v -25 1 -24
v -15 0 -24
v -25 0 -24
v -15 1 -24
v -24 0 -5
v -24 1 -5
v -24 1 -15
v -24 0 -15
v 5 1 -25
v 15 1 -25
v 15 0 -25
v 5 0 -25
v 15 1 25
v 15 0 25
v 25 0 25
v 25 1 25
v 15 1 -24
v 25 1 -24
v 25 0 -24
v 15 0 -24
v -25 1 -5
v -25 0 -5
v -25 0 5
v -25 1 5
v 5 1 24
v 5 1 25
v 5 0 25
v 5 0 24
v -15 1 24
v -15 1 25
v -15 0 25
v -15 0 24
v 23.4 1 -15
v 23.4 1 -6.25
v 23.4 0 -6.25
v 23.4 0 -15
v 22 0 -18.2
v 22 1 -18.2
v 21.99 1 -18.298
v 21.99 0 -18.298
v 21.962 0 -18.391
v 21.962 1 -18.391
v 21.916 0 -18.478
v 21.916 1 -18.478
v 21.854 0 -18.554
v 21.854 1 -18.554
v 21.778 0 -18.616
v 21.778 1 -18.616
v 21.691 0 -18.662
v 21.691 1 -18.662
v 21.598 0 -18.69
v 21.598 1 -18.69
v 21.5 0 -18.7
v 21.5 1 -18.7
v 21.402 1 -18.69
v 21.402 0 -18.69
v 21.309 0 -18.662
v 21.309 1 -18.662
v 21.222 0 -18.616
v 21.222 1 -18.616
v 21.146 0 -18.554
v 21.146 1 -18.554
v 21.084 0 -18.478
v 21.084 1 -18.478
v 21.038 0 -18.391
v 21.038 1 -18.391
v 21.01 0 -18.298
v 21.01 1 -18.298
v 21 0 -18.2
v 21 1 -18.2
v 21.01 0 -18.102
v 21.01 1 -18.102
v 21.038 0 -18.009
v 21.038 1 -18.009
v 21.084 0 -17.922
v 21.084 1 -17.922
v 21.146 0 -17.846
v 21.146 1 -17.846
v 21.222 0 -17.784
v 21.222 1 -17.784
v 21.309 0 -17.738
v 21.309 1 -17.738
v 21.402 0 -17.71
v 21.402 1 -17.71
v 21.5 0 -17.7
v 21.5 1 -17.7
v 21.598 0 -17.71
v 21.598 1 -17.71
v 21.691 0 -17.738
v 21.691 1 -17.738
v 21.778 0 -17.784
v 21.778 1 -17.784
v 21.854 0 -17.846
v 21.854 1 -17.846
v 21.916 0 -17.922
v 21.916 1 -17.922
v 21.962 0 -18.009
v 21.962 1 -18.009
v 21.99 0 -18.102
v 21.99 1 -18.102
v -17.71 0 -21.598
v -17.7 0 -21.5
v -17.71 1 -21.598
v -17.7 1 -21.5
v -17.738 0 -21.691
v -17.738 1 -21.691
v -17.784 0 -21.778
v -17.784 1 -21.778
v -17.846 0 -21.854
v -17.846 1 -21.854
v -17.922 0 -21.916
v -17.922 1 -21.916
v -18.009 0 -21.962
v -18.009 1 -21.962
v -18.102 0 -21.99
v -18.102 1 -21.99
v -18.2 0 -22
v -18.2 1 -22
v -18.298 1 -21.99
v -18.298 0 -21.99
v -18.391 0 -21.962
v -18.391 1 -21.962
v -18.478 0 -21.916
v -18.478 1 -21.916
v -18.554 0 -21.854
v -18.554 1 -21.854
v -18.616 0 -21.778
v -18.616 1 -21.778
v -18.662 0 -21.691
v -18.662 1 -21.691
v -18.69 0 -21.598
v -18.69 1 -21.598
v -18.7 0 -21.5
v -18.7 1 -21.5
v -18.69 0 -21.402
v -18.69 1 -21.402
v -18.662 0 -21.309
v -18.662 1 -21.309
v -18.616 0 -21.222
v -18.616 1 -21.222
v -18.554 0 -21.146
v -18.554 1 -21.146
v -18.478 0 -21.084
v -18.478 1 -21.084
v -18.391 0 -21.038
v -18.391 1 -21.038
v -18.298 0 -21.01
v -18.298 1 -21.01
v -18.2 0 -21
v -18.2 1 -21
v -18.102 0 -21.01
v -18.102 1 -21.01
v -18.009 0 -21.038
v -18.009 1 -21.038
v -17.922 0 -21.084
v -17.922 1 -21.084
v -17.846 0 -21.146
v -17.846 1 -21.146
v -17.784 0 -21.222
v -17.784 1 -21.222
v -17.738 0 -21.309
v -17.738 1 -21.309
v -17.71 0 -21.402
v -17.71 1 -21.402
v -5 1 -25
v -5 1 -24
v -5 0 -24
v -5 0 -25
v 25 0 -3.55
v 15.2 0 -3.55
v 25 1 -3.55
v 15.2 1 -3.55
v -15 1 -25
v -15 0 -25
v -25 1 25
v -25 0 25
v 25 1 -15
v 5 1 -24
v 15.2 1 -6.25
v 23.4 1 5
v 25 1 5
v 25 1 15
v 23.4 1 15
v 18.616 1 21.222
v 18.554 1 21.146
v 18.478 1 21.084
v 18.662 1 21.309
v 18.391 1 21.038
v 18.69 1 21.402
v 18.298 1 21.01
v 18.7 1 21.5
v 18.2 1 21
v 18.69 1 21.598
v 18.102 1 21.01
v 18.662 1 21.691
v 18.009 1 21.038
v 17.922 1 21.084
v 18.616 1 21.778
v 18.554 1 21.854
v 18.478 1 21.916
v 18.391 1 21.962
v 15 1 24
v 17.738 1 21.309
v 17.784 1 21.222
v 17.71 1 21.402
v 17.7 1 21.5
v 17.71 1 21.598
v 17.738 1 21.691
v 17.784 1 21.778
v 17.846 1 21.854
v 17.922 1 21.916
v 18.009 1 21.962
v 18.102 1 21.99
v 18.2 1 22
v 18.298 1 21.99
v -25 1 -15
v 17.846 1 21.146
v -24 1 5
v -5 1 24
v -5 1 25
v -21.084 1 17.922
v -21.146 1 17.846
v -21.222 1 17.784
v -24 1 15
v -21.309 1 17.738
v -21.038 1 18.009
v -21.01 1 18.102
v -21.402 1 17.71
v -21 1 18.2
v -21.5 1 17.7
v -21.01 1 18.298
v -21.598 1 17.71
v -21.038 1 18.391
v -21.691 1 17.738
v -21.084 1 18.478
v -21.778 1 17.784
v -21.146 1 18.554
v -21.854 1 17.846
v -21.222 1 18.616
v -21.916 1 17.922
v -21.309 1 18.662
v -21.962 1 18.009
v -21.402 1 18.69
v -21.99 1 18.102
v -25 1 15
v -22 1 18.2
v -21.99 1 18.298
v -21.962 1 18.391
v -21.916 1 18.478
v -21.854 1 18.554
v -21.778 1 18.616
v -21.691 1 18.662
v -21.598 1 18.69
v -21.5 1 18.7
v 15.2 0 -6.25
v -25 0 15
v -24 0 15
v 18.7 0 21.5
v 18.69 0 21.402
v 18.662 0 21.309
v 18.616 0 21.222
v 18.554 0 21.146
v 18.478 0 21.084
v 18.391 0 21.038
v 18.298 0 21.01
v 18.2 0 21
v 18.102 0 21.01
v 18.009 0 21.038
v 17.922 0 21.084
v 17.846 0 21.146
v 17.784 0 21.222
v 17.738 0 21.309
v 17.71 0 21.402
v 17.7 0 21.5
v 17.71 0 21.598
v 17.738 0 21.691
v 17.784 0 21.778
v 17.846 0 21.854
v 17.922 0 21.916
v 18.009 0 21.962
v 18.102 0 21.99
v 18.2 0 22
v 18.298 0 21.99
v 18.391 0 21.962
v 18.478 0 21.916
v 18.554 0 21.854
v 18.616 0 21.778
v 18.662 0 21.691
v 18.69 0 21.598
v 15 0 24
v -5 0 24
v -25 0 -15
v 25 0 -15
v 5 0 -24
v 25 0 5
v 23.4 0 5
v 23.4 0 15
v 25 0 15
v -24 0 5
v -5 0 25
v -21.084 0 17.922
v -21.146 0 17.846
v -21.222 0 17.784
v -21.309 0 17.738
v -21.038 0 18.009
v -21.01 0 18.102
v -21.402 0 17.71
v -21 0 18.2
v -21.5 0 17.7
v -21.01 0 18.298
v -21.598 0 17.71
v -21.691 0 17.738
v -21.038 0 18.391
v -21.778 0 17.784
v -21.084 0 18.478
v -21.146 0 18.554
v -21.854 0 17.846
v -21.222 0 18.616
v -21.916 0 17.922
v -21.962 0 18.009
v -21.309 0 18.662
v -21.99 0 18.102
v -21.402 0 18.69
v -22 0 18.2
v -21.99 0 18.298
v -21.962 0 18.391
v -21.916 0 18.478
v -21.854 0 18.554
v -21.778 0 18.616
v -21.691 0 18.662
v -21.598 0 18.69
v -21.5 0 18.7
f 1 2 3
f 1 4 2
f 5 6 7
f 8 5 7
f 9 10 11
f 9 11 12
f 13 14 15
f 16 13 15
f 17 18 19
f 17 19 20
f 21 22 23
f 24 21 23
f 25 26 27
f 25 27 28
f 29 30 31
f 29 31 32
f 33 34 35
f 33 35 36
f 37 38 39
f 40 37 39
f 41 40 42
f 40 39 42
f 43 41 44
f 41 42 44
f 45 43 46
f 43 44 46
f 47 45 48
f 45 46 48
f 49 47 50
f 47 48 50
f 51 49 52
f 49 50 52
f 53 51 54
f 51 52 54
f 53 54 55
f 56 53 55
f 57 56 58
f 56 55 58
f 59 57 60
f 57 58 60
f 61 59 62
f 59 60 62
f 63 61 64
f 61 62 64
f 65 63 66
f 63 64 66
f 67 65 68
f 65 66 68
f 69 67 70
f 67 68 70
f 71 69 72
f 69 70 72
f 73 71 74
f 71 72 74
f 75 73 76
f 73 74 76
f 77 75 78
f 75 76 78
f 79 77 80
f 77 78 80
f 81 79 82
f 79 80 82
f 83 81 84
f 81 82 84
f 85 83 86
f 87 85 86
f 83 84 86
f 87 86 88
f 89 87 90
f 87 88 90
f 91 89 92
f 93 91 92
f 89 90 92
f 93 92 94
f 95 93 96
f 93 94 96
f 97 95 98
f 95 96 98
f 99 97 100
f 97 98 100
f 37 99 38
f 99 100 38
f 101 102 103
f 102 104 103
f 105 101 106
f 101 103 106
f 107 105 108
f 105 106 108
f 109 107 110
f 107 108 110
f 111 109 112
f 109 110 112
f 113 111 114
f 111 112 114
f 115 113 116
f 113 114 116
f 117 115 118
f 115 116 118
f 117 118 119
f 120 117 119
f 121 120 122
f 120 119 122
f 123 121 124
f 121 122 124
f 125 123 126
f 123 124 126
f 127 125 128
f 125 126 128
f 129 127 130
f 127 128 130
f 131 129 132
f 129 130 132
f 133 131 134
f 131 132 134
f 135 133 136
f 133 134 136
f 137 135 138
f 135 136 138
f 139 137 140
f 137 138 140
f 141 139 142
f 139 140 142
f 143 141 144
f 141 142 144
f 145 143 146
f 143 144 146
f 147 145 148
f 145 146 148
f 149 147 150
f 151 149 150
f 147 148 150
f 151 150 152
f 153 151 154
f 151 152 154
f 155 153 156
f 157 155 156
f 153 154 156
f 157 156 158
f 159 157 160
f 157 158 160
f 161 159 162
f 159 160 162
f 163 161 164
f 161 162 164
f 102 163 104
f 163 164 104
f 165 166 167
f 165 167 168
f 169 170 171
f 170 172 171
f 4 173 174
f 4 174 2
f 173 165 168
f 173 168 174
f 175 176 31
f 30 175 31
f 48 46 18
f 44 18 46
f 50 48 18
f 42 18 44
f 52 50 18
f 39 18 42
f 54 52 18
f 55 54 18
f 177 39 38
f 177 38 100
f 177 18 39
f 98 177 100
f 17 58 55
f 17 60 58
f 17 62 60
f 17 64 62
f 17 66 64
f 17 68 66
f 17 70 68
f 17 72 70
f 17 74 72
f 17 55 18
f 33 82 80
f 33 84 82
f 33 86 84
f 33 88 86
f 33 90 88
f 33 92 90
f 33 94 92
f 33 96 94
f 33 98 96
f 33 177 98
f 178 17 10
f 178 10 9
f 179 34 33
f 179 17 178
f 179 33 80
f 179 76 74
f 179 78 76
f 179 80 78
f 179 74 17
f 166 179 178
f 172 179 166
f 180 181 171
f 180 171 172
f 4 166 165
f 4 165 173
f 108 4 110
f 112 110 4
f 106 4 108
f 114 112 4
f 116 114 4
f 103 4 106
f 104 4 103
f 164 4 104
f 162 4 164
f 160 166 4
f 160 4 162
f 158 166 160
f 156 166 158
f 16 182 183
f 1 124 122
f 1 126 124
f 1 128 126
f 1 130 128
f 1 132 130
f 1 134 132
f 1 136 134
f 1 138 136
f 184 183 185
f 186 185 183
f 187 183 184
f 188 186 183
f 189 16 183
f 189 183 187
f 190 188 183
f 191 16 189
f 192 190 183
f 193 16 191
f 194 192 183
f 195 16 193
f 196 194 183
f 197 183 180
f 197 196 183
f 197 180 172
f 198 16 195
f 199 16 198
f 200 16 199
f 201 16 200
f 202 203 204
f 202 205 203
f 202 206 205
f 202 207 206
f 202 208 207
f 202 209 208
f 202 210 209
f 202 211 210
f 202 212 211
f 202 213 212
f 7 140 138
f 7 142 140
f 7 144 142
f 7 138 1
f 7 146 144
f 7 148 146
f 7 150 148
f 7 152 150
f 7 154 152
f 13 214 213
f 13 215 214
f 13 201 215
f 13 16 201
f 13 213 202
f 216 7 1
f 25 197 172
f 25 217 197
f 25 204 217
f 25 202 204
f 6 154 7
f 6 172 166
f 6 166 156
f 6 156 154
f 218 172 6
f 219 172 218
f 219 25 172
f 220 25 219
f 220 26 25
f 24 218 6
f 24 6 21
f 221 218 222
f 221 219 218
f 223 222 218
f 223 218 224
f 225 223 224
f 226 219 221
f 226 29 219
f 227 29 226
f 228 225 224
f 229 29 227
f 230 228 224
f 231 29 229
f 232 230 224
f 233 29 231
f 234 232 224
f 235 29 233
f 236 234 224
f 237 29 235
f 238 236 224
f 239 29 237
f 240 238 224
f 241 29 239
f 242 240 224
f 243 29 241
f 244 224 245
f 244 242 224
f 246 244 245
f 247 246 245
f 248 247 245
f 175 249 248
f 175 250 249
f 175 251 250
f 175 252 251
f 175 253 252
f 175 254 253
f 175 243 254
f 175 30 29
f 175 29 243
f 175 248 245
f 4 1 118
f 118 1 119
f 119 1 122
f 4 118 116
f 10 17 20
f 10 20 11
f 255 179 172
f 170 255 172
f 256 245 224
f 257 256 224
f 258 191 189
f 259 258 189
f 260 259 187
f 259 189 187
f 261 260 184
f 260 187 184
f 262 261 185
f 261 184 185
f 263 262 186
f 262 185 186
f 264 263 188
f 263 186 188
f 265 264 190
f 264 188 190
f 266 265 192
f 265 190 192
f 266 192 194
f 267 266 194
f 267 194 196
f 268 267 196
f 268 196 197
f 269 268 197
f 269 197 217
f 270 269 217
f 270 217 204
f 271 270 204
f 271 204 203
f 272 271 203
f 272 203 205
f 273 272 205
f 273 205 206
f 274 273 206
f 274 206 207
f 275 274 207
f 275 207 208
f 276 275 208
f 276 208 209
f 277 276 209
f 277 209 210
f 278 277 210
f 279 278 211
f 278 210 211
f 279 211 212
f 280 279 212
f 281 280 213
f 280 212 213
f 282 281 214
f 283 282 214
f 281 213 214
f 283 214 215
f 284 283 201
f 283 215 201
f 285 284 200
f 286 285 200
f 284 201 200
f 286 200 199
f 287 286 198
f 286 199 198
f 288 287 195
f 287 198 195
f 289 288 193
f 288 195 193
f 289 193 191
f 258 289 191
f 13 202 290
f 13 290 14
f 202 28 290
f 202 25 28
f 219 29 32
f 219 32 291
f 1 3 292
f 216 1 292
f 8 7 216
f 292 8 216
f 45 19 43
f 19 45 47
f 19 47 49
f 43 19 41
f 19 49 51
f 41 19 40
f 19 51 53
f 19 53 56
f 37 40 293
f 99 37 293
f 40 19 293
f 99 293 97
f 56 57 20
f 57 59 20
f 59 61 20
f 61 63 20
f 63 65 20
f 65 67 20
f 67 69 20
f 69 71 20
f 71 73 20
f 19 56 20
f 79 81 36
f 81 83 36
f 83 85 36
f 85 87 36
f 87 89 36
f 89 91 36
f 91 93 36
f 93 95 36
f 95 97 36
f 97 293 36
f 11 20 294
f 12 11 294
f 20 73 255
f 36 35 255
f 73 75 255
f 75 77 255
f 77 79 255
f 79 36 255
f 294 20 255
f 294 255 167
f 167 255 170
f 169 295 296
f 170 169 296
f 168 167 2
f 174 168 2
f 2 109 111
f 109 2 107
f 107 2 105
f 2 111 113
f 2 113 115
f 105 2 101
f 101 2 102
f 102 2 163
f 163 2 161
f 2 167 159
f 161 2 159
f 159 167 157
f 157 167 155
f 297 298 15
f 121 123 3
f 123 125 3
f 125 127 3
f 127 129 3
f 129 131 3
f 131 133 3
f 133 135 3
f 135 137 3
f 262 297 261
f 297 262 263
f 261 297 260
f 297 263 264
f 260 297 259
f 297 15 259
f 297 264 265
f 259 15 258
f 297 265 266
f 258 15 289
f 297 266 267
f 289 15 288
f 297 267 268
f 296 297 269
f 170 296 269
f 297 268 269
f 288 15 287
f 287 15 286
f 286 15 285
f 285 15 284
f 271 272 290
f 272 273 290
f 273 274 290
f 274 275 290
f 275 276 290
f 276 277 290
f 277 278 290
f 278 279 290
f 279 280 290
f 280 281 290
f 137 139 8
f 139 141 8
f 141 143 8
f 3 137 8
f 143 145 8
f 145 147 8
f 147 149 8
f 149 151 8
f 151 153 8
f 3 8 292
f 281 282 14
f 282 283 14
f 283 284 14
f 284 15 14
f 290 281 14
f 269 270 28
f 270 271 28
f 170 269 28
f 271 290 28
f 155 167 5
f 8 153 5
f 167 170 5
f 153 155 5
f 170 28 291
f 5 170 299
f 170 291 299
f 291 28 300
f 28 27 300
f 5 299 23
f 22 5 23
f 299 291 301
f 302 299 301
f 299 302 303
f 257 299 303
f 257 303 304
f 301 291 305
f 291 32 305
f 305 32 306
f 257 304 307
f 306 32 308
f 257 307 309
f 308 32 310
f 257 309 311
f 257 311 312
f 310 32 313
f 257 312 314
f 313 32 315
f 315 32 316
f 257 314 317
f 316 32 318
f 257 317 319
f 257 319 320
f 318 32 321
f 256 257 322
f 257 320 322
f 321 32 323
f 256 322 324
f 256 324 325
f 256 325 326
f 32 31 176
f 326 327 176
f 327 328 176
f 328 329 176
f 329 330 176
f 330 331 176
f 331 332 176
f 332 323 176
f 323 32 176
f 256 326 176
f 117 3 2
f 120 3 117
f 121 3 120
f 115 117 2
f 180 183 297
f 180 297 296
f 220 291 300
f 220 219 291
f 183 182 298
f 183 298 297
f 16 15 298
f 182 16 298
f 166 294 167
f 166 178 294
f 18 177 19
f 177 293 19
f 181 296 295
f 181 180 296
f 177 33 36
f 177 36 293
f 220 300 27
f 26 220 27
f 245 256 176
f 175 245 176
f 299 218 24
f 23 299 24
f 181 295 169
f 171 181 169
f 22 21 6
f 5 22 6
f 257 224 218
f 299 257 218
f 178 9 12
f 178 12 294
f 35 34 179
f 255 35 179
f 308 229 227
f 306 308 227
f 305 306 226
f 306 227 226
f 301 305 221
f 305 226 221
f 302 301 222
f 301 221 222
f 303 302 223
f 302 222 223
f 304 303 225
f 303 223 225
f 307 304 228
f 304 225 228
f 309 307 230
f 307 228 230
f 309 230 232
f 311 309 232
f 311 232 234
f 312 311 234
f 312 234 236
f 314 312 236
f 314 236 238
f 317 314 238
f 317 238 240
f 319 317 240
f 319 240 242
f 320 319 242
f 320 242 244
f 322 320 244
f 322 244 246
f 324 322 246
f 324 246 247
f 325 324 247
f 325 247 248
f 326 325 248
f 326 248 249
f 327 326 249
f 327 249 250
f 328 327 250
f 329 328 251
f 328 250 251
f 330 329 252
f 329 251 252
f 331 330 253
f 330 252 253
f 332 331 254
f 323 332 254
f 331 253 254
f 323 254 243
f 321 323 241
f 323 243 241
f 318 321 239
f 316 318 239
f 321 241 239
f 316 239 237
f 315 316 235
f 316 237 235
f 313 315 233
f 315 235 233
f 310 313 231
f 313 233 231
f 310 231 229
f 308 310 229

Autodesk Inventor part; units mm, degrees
ref_plane "YZ Plane" through (0, 0, 0) normal (1, 0, 0) x (0, 1, 0)
ref_plane "XZ Plane" through (0, 0, 0) normal (0, 1, 0) x (-1, 0, 0)
ref_plane "XY Plane" through (0, 0, 0) normal (0, 0, 1) x (1, 0, 0)
sketch "Sketch1" plane through (0, 0, 0) normal (0, 1, 0) x (-1, 0, 0)
  line L0 (-25, -25) -> (25, -25)
  line L1 (25, -25) -> (25, 25)
  line L2 (25, 25) -> (-25, 25)
  line L3 (-25, 25) -> (-25, -25)
  line L4 (-25, -25) -> (25, 25) construction
  line L5 (25, -25) -> (-25, 25) construction
  point P0 (0, 0)
  dimension "d0" = 50
  dimension "d1" = 50
extrude "Extrusion1" add sketch "Sketch1" along normal blind 1
sketch "Sketch2" plane through (0, 1, 0) normal (0, 1, 0) x (1, 0, 0)
  line L0 (25, -25) -> (25, -15)
  line L1 (25, -25) -> (25, 25) projected
  line L2 (25, -15) -> (23.4, -15)
  line L3 (23.4, -15) -> (23.4, -5)
  line L4 (23.4, -5) -> (25, -5)
  line L5 (25, -5) -> (25, 5)
  line L6 (25, 5) -> (23.4, 5)
  line L7 (23.4, 5) -> (23.4, 15)
  line L8 (23.4, 15) -> (25, 15)
  line L9 (25, 15) -> (25, 25)
  line L10 (27, 25) -> (27, -25)
  line L11 (27, -25) -> (25, -25)
  point P0 (0, 0)
  dimension "d4" = 1.6
  dimension "d5" = 10
  dimension "d6" = 10
extrude "Extrusion2" cut sketch "Sketch2" against normal blind 1
sketch "Sketch3" plane through (0, 1, 0) normal (0, 1, 0) x (1, 0, 0)
  line L0 (25, 25) -> (25, 24)
  line L1 (25, 24) -> (15, 24)
  line L2 (15, 24) -> (15, 25)
  line L3 (25, 25) -> (-25, 25) projected
  line L4 (15, 25) -> (5, 25)
  line L5 (5, 25) -> (5, 24)
  line L6 (5, 24) -> (-5, 24)
  line L7 (-5, 24) -> (-5, 25)
  line L8 (-5, 25) -> (-15, 25)
  line L9 (-15, 25) -> (-15, 24)
  line L10 (-15, 24) -> (-25, 24)
  line L11 (-25, 24) -> (-25, 27)
  line L12 (-25, 27) -> (25, 27)
  line L13 (25, 27) -> (25, 25)
  point P0 (0, 0)
extrude "Extrusion3" cut sketch "Sketch3" against normal blind 1
sketch "Sketch4" plane through (0, 1, 0) normal (0, 1, 0) x (1, 0, 0)
  line L0 (-25, -25) -> (-25, -15)
  line L1 (-25, -15) -> (-24, -15)
  line L2 (-24, -15) -> (-24, -5)
  line L3 (-24, -5) -> (-25, -5)
  line L4 (-25, 24) -> (-25, -25) projected
  line L5 (-25, -5) -> (-25, 5)
  line L6 (-25, 24) -> (-25, -25) projected
  line L7 (-25, 5) -> (-24, 5)
  line L8 (-24, 5) -> (-24, 15)
  line L9 (-24, 15) -> (-25, 15)
  line L10 (-25, 24) -> (-27, 23)
  line L11 (-27, 23) -> (-27, -24.2648)
  line L12 (-27, -24.2648) -> (-25, -25)
  point P0 (0, 0)
  dimension "d11" = 10
  dimension "d12" = 10
  dimension "d13" = 10
extrude "Extrusion4" cut sketch "Sketch4" against normal blind 1 contours L4 L3 L2 L1 | L4 L9 L8 L7
sketch "Sketch5" plane through (0, 1, 0) normal (0, 1, 0) x (1, 0, 0)
  line L0 (-25, -25) -> (-15, -25)
  line L1 (-25, -25) -> (25, -25) projected
  line L2 (-15, -25) -> (-15, -24)
  line L3 (-15, -24) -> (-5, -24)
  line L4 (-5, -24) -> (-5, -25)
  line L5 (-5, -25) -> (5, -25)
  line L6 (5, -25) -> (5, -24)
  line L7 (5, -24) -> (15, -24)
  line L8 (15, -24) -> (15, -25)
  line L9 (25, -25) -> (25, -26)
  line L10 (25, -26) -> (-25, -26)
  line L11 (-25, -26) -> (-25, -25)
  point P0 (0, 0)
  dimension "d16" = 10
extrude "Extrusion5" cut sketch "Sketch5" against normal blind 1 contours L2 L3 L4 L1 | L6 L7 L8 L1
sketch "Sketch6" plane through (0, 1, 0) normal (0, 1, 0) x (1, 0, 0)
  circle A0 centre (-21.5, -18.2) radius 0.5
  circle A1 centre (-18.2, 21.5) radius 0.5
  circle A2 centre (18.2, -21.5) radius 0.5
  circle A3 centre (21.5, 18.2) radius 0.5
  line L0 (15, -25) -> (25, -25) projected
  line L1 (25, -25) -> (25, -15) projected
  line L2 (-25, -25) -> (-15, -25) projected
  line L3 (-25, -15) -> (-25, -25) projected
  line L4 (-5, 25) -> (-15, 25) projected
  line L5 (-25, 24) -> (-25, 15) projected
  line L6 (25, 24) -> (15, 24) projected
  line L7 (25, 15) -> (25, 24) projected
  point P0 (0, 0)
  dimension "d21" = 1
  dimension "d22" = 1
  dimension "d23" = 1
  dimension "d24" = 1
  dimension "d25" = 3.5
  dimension "d26" = 6.8
  dimension "d27" = 6.8
  dimension "d28" = 3.5
  dimension "d29" = 3.5
  dimension "d30" = 6.8
  dimension "d31" = 5.8
  dimension "d32" = 3.5
extrude "Extrusion6" cut sketch "Sketch6" against normal blind 1
sketch "Sketch7" plane through (0, 1, 0) normal (0, 1, 0) x (1, 0, 0)
  line L0 (15.2, 3.55) -> (23.4, 3.55)
  line L1 (23.4, 3.55) -> (23.4, 6.25)
  line L2 (23.4, 6.25) -> (15.2, 6.25)
  line L3 (15.2, 6.25) -> (15.2, 3.55)
  line L4 (23.4, -15) -> (23.4, -5) projected
  line L5 (15, -25) -> (25, -25) projected
  line L6 (23.4, 3.55) -> (25, 3.55)
  line L7 (25, 3.55) -> (25, 5)
  line L8 (25, 5) -> (23.4, 5)
  line L9 (23.4, 5) -> (23.4, 3.55)
  point P0 (0, 0)
  dimension "d37" = 8.2
  dimension "d38" = 2.7
  dimension "d39" = 0
  dimension "d40" = 28.55
extrude "Extrusion8" cut sketch "Sketch7" against normal blind 10
properties part number "Side Panel" material "ABS Plastic"
